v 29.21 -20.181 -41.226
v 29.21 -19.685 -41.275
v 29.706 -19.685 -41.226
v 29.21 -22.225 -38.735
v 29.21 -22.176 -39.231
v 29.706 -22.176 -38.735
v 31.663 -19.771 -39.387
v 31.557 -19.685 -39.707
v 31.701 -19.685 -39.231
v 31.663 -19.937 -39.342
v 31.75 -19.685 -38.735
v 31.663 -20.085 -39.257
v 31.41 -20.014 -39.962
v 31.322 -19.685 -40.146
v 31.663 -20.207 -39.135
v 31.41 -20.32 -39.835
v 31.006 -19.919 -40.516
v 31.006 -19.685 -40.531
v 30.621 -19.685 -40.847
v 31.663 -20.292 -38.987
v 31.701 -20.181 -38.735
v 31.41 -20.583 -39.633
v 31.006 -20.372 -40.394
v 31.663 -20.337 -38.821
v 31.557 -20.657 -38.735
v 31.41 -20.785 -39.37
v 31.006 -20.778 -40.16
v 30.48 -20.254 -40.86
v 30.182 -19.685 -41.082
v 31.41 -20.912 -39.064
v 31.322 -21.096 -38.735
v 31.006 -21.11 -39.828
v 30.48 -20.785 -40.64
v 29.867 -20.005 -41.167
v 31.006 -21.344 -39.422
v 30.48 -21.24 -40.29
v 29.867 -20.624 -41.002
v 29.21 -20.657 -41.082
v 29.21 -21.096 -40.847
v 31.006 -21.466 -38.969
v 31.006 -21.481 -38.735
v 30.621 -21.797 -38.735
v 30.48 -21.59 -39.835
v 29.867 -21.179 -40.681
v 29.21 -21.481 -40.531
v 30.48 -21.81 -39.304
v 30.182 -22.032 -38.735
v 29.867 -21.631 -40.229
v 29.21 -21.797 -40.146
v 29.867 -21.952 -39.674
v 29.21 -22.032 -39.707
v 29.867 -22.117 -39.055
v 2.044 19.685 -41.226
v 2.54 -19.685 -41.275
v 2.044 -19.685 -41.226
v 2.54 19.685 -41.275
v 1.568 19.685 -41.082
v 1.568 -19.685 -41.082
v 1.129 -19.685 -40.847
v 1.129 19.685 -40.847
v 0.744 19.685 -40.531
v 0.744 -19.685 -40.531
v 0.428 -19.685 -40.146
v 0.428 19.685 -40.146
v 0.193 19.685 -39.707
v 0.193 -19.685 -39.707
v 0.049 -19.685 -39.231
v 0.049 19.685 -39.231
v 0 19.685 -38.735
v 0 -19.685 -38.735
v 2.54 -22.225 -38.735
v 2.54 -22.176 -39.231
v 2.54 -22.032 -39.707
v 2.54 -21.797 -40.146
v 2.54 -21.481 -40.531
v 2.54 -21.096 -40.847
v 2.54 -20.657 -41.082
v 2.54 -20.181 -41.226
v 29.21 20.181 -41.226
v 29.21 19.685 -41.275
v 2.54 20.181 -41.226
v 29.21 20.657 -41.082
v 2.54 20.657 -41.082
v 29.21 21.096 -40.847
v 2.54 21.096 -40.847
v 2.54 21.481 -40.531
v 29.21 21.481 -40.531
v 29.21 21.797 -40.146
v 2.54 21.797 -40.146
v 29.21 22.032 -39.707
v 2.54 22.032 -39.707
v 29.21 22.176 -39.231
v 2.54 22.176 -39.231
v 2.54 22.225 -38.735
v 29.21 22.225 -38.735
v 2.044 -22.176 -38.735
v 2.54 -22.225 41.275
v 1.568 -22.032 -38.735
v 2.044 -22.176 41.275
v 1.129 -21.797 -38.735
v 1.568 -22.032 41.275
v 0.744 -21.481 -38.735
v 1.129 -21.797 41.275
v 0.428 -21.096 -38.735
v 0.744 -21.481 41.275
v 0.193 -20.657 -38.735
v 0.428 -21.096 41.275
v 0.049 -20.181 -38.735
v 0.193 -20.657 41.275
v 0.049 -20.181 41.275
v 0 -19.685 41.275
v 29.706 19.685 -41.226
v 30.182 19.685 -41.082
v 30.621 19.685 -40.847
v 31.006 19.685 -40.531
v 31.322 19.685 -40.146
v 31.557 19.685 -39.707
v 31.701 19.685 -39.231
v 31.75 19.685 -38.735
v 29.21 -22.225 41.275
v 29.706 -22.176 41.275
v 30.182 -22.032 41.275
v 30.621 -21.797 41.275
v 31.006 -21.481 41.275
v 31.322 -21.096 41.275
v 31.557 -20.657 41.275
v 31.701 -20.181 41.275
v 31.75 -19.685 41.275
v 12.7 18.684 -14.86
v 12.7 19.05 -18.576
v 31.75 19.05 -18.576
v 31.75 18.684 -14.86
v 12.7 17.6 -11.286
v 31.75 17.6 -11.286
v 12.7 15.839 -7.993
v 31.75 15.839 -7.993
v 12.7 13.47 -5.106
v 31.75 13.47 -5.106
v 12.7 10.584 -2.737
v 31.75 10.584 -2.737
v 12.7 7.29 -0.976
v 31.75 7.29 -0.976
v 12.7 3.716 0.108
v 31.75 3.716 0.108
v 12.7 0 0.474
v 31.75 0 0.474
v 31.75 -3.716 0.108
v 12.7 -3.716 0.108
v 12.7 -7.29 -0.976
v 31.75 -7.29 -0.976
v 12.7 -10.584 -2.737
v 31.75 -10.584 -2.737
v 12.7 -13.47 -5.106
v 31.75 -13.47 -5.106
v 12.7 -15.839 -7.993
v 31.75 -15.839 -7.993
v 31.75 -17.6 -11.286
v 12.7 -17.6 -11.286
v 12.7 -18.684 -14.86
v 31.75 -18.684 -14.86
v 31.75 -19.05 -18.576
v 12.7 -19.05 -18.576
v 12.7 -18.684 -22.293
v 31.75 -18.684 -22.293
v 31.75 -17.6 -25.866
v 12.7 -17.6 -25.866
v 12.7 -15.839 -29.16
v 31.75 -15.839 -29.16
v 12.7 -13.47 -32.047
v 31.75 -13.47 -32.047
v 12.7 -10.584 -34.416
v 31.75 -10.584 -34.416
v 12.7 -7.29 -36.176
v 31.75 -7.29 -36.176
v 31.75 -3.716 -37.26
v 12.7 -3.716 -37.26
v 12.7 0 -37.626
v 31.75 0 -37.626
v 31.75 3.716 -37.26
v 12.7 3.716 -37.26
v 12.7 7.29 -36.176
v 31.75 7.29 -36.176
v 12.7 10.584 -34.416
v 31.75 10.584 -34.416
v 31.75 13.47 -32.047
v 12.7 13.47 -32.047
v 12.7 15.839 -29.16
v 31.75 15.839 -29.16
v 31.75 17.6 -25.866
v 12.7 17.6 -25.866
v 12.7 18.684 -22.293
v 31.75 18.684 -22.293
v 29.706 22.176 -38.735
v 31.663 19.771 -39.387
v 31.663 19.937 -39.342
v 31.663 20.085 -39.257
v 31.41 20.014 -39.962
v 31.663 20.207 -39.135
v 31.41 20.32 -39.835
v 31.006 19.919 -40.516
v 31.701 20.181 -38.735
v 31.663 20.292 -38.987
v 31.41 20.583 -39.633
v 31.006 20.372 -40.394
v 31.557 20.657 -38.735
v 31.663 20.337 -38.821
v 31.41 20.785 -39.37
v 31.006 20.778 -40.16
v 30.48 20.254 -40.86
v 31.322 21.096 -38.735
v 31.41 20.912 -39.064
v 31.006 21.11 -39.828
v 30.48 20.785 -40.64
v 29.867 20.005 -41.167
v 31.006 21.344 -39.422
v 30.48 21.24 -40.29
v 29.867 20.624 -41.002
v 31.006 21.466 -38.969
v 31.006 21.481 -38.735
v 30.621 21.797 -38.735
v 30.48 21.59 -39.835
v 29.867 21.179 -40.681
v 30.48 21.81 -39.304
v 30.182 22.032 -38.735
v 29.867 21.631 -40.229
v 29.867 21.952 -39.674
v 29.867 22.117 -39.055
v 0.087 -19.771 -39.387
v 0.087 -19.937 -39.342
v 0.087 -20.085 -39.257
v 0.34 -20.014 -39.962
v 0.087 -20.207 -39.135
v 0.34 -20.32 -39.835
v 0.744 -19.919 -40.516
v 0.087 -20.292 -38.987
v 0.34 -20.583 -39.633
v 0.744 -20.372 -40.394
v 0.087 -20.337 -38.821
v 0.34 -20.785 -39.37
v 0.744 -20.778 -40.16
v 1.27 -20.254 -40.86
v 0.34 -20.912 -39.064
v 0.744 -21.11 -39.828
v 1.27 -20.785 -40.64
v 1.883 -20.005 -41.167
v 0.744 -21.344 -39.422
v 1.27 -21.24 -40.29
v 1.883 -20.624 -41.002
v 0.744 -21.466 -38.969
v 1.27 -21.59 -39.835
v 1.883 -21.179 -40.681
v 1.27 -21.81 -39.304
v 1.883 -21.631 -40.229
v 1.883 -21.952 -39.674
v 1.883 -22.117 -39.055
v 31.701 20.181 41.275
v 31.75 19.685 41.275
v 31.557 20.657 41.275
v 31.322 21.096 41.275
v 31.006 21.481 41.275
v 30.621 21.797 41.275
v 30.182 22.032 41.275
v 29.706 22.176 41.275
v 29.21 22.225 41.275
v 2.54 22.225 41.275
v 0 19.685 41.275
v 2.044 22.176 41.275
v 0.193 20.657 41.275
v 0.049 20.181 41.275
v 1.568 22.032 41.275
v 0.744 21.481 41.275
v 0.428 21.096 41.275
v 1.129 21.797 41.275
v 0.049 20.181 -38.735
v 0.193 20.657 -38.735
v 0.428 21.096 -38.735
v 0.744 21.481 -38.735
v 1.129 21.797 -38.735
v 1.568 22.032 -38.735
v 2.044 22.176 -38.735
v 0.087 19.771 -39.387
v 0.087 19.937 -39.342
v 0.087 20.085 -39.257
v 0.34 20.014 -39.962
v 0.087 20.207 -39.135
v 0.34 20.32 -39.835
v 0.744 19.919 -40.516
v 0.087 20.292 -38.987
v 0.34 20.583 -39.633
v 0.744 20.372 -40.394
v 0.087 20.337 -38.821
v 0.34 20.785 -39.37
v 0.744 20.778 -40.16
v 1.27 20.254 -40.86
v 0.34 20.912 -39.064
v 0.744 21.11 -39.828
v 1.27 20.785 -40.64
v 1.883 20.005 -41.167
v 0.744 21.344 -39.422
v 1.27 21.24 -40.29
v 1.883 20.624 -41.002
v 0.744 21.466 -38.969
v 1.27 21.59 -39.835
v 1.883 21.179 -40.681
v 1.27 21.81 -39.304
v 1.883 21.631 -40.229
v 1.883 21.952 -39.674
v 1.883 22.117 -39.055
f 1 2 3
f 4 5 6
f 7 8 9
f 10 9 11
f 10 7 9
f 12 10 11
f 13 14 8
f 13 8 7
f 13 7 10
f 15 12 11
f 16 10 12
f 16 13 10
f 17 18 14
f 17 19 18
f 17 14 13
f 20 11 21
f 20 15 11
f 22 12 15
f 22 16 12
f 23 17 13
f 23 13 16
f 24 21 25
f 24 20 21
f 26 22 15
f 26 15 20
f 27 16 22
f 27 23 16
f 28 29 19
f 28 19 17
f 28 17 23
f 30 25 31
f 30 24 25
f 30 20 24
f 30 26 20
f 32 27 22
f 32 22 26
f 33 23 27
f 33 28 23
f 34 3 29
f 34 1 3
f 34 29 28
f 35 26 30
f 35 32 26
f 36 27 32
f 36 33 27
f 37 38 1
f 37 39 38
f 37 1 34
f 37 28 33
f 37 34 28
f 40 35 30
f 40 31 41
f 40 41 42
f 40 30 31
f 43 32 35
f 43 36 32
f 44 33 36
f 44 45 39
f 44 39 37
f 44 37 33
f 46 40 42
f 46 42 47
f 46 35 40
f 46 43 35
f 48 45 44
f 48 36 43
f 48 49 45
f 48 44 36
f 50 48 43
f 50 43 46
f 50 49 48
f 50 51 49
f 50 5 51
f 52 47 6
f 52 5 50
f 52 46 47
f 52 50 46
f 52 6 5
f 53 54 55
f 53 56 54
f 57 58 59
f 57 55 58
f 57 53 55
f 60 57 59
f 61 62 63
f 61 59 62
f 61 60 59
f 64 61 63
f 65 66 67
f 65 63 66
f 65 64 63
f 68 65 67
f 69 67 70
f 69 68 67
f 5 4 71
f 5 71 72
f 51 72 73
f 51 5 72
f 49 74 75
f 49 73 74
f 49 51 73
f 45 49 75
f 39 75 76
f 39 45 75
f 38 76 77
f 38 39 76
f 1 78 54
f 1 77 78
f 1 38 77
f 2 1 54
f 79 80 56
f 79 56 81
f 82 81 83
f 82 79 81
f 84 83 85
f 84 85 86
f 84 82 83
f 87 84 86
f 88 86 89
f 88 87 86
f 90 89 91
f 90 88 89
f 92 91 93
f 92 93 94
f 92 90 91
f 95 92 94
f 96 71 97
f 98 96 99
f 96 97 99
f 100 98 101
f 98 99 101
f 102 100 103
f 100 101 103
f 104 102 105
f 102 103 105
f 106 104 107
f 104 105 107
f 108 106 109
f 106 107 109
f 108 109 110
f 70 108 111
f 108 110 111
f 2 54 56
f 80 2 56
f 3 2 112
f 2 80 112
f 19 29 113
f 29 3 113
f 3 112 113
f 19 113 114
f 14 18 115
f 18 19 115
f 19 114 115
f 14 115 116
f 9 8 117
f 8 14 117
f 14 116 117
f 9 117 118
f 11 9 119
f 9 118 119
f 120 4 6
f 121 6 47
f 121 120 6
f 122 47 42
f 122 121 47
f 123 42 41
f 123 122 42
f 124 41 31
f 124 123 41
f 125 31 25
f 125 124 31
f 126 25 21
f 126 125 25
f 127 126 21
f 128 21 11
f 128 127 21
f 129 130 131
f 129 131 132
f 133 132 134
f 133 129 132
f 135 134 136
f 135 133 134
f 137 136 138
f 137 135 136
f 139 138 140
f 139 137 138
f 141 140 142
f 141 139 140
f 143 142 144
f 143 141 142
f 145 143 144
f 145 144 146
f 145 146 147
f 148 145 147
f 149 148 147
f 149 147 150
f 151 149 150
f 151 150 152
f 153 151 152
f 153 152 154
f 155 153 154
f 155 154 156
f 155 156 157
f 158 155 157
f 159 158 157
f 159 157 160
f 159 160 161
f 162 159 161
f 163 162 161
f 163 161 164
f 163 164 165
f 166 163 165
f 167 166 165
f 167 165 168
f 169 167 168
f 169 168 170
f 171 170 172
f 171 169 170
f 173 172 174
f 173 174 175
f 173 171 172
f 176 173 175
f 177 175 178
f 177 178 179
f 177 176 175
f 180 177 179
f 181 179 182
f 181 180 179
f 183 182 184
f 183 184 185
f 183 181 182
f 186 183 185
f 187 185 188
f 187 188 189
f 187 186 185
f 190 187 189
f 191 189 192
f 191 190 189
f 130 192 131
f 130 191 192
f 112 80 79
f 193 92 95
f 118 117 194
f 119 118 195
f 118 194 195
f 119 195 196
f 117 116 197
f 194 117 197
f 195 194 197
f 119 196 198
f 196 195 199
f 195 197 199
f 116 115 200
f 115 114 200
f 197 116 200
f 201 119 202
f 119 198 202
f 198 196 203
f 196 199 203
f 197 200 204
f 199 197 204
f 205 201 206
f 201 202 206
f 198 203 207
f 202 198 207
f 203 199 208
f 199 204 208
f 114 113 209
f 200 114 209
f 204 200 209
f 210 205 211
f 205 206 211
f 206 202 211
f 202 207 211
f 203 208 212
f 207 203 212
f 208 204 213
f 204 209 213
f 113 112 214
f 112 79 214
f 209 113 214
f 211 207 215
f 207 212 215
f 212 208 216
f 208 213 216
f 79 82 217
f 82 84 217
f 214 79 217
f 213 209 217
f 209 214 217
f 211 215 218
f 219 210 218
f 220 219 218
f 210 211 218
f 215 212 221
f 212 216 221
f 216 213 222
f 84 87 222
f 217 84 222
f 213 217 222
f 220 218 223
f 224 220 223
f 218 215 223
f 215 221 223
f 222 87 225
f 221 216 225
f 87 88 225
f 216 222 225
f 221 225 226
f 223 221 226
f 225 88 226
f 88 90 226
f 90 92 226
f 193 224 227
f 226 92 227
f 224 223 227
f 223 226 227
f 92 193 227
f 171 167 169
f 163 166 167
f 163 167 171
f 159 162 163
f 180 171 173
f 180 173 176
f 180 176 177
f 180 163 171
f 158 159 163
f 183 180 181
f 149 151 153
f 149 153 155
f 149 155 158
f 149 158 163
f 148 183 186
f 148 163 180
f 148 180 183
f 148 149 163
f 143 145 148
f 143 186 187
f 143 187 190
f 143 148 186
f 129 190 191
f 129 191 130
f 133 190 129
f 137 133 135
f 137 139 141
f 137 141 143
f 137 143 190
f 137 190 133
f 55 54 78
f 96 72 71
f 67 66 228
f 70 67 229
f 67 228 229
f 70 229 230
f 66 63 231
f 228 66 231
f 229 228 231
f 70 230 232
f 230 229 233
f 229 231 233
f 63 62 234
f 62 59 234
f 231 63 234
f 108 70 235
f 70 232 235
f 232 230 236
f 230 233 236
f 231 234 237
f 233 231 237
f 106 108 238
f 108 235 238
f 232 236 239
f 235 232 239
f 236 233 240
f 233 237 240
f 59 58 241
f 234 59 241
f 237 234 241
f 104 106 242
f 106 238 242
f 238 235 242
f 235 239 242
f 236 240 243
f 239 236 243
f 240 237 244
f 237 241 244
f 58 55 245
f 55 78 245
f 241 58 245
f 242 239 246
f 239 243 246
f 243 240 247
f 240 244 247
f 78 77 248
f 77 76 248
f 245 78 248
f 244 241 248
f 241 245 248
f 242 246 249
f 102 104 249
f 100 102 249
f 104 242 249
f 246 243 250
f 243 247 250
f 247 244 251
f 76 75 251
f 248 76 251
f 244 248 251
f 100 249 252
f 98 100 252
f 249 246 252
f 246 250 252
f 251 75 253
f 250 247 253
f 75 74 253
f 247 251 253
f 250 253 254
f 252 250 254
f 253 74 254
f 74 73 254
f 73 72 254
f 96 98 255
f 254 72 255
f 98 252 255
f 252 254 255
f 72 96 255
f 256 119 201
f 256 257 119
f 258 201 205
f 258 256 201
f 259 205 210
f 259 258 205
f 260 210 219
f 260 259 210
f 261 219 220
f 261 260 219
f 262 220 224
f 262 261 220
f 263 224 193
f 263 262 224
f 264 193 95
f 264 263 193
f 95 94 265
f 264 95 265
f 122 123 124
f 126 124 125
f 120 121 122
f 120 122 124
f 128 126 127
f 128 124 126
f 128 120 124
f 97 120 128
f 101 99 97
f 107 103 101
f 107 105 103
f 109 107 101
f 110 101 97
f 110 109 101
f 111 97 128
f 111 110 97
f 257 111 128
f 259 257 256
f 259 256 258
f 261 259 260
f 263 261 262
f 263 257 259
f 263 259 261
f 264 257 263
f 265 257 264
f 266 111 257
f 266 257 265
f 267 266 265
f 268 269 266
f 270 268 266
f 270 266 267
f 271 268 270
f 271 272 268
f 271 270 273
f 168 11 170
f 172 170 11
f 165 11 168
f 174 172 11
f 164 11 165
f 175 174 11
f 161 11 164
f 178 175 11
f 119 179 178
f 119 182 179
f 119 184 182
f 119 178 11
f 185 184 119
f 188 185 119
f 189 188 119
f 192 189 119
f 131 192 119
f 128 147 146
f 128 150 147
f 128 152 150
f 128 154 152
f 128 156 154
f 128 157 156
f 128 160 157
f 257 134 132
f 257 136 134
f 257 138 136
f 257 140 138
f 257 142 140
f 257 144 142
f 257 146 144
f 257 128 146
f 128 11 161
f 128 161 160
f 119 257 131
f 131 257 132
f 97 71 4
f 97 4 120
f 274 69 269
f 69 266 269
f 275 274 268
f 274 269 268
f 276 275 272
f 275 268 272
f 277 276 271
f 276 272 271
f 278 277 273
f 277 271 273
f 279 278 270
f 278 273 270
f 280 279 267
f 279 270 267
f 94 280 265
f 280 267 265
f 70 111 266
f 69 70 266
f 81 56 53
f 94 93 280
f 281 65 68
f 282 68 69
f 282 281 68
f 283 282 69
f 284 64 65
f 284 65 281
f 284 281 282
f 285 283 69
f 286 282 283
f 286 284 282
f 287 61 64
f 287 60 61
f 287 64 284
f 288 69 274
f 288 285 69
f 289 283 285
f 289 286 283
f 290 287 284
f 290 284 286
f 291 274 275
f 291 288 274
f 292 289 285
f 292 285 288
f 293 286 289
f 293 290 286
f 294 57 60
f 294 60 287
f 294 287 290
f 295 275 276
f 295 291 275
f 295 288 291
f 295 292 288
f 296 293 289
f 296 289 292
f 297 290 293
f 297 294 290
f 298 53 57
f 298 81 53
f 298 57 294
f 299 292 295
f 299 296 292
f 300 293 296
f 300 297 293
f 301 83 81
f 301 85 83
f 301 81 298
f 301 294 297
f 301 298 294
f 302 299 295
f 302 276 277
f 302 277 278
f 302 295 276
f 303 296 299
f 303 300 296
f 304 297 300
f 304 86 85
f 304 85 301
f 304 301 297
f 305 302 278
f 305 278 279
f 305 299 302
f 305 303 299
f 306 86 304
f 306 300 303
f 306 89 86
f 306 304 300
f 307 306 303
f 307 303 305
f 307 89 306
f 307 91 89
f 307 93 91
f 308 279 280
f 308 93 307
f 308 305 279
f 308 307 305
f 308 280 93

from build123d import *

# Parameters (mm, degrees)
F0_R     = 19.05
F1_DEPTH = 12.7
F0_W     = 44.45
F0_H     = 82.55
F2_DEPTH = 31.75
F3_R     = 2.54


with BuildPart() as f1:
    # F0 (on Right) → F1 (new body)
    with BuildSketch(Plane.YZ):
        with Locations((0, -18.576264)):
            Circle(F0_R)
    extrude(amount=F1_DEPTH)

    # F0 (on Right) → F2 (join)
    with BuildSketch(Plane.YZ):
        Rectangle(F0_W, F0_H)
        with Locations((0, -18.576264)):
            Circle(F0_R, mode=Mode.SUBTRACT)
    extrude(amount=F2_DEPTH)

    # F3
    f3_edges = [f1.edges().sort_by_distance(p)[0] for p in [
        (15.875, -22.225, -41.275),
        (15.875, 22.225, -41.275),
        (0, 0, -41.275),
        (31.75, 0, -41.275),
        (31.75, 22.225, 0),
        (0, 22.225, 0),
        (0, -22.225, 0),
        (31.75, -22.225, 0),
    ]]
    fillet(f3_edges, radius=F3_R)


solid = f1.part
